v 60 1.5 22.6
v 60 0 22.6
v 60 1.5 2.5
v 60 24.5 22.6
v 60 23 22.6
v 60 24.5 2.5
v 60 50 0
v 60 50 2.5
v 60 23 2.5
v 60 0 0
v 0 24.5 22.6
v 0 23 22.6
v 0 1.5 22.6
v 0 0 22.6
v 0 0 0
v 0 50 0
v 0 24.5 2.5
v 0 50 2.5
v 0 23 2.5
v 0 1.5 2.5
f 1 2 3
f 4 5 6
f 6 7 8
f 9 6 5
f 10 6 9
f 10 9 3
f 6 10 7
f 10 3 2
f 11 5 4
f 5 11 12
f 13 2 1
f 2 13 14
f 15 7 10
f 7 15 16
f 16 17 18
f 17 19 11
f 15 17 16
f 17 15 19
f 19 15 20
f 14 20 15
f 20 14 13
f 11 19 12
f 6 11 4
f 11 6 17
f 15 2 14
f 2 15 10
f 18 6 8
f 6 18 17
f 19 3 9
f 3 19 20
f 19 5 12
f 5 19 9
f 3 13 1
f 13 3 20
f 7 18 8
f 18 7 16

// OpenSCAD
/* [Shelf] */
shelf_thickness = 2.5;
shelf_depth = 49.9999999999;
shelf_length = 59.9999999999;

/* [Ledge] */
ledge_height = 20.1;
ledge_depth = 21.5;
ledge_length = 59.9999999999;
ledge_wall_thickness = 1.5;

/* [Combination] */
offset_depth = 0;
offset_length = 0;

/* [Additional Parts] */
additional_left_shelf_length = 0;
additional_right_shelf_length = 0;
additional_left_ledge_length = 0;
additional_right_ledge_length = 0;


module additional_parts(left_length, right_length, height, wall_thickness) {
  translate([-left_length, 0, 0]) {
    cube([left_length, wall_thickness, height]);
  }
  translate([ledge_length, 0, 0]) {
    cube([right_length, wall_thickness, height]);
  }
}

module ledge() {
  difference() {
      cube([ledge_length, ledge_depth + 2 * ledge_wall_thickness, ledge_height + shelf_thickness]);
      translate([0, ledge_wall_thickness, shelf_thickness]) {
          cube([ledge_length, ledge_depth, ledge_height]);
      }
  }
  additional_parts(additional_left_ledge_length, additional_right_ledge_length, ledge_height + shelf_thickness, ledge_wall_thickness);
}

module shelf() {
  cube([shelf_length, shelf_depth, shelf_thickness]);
  additional_parts(additional_left_shelf_length, additional_right_shelf_length, shelf_thickness, shelf_depth);
}

ledge();
translate([offset_length, offset_depth, 0]) {
  shelf();
}
